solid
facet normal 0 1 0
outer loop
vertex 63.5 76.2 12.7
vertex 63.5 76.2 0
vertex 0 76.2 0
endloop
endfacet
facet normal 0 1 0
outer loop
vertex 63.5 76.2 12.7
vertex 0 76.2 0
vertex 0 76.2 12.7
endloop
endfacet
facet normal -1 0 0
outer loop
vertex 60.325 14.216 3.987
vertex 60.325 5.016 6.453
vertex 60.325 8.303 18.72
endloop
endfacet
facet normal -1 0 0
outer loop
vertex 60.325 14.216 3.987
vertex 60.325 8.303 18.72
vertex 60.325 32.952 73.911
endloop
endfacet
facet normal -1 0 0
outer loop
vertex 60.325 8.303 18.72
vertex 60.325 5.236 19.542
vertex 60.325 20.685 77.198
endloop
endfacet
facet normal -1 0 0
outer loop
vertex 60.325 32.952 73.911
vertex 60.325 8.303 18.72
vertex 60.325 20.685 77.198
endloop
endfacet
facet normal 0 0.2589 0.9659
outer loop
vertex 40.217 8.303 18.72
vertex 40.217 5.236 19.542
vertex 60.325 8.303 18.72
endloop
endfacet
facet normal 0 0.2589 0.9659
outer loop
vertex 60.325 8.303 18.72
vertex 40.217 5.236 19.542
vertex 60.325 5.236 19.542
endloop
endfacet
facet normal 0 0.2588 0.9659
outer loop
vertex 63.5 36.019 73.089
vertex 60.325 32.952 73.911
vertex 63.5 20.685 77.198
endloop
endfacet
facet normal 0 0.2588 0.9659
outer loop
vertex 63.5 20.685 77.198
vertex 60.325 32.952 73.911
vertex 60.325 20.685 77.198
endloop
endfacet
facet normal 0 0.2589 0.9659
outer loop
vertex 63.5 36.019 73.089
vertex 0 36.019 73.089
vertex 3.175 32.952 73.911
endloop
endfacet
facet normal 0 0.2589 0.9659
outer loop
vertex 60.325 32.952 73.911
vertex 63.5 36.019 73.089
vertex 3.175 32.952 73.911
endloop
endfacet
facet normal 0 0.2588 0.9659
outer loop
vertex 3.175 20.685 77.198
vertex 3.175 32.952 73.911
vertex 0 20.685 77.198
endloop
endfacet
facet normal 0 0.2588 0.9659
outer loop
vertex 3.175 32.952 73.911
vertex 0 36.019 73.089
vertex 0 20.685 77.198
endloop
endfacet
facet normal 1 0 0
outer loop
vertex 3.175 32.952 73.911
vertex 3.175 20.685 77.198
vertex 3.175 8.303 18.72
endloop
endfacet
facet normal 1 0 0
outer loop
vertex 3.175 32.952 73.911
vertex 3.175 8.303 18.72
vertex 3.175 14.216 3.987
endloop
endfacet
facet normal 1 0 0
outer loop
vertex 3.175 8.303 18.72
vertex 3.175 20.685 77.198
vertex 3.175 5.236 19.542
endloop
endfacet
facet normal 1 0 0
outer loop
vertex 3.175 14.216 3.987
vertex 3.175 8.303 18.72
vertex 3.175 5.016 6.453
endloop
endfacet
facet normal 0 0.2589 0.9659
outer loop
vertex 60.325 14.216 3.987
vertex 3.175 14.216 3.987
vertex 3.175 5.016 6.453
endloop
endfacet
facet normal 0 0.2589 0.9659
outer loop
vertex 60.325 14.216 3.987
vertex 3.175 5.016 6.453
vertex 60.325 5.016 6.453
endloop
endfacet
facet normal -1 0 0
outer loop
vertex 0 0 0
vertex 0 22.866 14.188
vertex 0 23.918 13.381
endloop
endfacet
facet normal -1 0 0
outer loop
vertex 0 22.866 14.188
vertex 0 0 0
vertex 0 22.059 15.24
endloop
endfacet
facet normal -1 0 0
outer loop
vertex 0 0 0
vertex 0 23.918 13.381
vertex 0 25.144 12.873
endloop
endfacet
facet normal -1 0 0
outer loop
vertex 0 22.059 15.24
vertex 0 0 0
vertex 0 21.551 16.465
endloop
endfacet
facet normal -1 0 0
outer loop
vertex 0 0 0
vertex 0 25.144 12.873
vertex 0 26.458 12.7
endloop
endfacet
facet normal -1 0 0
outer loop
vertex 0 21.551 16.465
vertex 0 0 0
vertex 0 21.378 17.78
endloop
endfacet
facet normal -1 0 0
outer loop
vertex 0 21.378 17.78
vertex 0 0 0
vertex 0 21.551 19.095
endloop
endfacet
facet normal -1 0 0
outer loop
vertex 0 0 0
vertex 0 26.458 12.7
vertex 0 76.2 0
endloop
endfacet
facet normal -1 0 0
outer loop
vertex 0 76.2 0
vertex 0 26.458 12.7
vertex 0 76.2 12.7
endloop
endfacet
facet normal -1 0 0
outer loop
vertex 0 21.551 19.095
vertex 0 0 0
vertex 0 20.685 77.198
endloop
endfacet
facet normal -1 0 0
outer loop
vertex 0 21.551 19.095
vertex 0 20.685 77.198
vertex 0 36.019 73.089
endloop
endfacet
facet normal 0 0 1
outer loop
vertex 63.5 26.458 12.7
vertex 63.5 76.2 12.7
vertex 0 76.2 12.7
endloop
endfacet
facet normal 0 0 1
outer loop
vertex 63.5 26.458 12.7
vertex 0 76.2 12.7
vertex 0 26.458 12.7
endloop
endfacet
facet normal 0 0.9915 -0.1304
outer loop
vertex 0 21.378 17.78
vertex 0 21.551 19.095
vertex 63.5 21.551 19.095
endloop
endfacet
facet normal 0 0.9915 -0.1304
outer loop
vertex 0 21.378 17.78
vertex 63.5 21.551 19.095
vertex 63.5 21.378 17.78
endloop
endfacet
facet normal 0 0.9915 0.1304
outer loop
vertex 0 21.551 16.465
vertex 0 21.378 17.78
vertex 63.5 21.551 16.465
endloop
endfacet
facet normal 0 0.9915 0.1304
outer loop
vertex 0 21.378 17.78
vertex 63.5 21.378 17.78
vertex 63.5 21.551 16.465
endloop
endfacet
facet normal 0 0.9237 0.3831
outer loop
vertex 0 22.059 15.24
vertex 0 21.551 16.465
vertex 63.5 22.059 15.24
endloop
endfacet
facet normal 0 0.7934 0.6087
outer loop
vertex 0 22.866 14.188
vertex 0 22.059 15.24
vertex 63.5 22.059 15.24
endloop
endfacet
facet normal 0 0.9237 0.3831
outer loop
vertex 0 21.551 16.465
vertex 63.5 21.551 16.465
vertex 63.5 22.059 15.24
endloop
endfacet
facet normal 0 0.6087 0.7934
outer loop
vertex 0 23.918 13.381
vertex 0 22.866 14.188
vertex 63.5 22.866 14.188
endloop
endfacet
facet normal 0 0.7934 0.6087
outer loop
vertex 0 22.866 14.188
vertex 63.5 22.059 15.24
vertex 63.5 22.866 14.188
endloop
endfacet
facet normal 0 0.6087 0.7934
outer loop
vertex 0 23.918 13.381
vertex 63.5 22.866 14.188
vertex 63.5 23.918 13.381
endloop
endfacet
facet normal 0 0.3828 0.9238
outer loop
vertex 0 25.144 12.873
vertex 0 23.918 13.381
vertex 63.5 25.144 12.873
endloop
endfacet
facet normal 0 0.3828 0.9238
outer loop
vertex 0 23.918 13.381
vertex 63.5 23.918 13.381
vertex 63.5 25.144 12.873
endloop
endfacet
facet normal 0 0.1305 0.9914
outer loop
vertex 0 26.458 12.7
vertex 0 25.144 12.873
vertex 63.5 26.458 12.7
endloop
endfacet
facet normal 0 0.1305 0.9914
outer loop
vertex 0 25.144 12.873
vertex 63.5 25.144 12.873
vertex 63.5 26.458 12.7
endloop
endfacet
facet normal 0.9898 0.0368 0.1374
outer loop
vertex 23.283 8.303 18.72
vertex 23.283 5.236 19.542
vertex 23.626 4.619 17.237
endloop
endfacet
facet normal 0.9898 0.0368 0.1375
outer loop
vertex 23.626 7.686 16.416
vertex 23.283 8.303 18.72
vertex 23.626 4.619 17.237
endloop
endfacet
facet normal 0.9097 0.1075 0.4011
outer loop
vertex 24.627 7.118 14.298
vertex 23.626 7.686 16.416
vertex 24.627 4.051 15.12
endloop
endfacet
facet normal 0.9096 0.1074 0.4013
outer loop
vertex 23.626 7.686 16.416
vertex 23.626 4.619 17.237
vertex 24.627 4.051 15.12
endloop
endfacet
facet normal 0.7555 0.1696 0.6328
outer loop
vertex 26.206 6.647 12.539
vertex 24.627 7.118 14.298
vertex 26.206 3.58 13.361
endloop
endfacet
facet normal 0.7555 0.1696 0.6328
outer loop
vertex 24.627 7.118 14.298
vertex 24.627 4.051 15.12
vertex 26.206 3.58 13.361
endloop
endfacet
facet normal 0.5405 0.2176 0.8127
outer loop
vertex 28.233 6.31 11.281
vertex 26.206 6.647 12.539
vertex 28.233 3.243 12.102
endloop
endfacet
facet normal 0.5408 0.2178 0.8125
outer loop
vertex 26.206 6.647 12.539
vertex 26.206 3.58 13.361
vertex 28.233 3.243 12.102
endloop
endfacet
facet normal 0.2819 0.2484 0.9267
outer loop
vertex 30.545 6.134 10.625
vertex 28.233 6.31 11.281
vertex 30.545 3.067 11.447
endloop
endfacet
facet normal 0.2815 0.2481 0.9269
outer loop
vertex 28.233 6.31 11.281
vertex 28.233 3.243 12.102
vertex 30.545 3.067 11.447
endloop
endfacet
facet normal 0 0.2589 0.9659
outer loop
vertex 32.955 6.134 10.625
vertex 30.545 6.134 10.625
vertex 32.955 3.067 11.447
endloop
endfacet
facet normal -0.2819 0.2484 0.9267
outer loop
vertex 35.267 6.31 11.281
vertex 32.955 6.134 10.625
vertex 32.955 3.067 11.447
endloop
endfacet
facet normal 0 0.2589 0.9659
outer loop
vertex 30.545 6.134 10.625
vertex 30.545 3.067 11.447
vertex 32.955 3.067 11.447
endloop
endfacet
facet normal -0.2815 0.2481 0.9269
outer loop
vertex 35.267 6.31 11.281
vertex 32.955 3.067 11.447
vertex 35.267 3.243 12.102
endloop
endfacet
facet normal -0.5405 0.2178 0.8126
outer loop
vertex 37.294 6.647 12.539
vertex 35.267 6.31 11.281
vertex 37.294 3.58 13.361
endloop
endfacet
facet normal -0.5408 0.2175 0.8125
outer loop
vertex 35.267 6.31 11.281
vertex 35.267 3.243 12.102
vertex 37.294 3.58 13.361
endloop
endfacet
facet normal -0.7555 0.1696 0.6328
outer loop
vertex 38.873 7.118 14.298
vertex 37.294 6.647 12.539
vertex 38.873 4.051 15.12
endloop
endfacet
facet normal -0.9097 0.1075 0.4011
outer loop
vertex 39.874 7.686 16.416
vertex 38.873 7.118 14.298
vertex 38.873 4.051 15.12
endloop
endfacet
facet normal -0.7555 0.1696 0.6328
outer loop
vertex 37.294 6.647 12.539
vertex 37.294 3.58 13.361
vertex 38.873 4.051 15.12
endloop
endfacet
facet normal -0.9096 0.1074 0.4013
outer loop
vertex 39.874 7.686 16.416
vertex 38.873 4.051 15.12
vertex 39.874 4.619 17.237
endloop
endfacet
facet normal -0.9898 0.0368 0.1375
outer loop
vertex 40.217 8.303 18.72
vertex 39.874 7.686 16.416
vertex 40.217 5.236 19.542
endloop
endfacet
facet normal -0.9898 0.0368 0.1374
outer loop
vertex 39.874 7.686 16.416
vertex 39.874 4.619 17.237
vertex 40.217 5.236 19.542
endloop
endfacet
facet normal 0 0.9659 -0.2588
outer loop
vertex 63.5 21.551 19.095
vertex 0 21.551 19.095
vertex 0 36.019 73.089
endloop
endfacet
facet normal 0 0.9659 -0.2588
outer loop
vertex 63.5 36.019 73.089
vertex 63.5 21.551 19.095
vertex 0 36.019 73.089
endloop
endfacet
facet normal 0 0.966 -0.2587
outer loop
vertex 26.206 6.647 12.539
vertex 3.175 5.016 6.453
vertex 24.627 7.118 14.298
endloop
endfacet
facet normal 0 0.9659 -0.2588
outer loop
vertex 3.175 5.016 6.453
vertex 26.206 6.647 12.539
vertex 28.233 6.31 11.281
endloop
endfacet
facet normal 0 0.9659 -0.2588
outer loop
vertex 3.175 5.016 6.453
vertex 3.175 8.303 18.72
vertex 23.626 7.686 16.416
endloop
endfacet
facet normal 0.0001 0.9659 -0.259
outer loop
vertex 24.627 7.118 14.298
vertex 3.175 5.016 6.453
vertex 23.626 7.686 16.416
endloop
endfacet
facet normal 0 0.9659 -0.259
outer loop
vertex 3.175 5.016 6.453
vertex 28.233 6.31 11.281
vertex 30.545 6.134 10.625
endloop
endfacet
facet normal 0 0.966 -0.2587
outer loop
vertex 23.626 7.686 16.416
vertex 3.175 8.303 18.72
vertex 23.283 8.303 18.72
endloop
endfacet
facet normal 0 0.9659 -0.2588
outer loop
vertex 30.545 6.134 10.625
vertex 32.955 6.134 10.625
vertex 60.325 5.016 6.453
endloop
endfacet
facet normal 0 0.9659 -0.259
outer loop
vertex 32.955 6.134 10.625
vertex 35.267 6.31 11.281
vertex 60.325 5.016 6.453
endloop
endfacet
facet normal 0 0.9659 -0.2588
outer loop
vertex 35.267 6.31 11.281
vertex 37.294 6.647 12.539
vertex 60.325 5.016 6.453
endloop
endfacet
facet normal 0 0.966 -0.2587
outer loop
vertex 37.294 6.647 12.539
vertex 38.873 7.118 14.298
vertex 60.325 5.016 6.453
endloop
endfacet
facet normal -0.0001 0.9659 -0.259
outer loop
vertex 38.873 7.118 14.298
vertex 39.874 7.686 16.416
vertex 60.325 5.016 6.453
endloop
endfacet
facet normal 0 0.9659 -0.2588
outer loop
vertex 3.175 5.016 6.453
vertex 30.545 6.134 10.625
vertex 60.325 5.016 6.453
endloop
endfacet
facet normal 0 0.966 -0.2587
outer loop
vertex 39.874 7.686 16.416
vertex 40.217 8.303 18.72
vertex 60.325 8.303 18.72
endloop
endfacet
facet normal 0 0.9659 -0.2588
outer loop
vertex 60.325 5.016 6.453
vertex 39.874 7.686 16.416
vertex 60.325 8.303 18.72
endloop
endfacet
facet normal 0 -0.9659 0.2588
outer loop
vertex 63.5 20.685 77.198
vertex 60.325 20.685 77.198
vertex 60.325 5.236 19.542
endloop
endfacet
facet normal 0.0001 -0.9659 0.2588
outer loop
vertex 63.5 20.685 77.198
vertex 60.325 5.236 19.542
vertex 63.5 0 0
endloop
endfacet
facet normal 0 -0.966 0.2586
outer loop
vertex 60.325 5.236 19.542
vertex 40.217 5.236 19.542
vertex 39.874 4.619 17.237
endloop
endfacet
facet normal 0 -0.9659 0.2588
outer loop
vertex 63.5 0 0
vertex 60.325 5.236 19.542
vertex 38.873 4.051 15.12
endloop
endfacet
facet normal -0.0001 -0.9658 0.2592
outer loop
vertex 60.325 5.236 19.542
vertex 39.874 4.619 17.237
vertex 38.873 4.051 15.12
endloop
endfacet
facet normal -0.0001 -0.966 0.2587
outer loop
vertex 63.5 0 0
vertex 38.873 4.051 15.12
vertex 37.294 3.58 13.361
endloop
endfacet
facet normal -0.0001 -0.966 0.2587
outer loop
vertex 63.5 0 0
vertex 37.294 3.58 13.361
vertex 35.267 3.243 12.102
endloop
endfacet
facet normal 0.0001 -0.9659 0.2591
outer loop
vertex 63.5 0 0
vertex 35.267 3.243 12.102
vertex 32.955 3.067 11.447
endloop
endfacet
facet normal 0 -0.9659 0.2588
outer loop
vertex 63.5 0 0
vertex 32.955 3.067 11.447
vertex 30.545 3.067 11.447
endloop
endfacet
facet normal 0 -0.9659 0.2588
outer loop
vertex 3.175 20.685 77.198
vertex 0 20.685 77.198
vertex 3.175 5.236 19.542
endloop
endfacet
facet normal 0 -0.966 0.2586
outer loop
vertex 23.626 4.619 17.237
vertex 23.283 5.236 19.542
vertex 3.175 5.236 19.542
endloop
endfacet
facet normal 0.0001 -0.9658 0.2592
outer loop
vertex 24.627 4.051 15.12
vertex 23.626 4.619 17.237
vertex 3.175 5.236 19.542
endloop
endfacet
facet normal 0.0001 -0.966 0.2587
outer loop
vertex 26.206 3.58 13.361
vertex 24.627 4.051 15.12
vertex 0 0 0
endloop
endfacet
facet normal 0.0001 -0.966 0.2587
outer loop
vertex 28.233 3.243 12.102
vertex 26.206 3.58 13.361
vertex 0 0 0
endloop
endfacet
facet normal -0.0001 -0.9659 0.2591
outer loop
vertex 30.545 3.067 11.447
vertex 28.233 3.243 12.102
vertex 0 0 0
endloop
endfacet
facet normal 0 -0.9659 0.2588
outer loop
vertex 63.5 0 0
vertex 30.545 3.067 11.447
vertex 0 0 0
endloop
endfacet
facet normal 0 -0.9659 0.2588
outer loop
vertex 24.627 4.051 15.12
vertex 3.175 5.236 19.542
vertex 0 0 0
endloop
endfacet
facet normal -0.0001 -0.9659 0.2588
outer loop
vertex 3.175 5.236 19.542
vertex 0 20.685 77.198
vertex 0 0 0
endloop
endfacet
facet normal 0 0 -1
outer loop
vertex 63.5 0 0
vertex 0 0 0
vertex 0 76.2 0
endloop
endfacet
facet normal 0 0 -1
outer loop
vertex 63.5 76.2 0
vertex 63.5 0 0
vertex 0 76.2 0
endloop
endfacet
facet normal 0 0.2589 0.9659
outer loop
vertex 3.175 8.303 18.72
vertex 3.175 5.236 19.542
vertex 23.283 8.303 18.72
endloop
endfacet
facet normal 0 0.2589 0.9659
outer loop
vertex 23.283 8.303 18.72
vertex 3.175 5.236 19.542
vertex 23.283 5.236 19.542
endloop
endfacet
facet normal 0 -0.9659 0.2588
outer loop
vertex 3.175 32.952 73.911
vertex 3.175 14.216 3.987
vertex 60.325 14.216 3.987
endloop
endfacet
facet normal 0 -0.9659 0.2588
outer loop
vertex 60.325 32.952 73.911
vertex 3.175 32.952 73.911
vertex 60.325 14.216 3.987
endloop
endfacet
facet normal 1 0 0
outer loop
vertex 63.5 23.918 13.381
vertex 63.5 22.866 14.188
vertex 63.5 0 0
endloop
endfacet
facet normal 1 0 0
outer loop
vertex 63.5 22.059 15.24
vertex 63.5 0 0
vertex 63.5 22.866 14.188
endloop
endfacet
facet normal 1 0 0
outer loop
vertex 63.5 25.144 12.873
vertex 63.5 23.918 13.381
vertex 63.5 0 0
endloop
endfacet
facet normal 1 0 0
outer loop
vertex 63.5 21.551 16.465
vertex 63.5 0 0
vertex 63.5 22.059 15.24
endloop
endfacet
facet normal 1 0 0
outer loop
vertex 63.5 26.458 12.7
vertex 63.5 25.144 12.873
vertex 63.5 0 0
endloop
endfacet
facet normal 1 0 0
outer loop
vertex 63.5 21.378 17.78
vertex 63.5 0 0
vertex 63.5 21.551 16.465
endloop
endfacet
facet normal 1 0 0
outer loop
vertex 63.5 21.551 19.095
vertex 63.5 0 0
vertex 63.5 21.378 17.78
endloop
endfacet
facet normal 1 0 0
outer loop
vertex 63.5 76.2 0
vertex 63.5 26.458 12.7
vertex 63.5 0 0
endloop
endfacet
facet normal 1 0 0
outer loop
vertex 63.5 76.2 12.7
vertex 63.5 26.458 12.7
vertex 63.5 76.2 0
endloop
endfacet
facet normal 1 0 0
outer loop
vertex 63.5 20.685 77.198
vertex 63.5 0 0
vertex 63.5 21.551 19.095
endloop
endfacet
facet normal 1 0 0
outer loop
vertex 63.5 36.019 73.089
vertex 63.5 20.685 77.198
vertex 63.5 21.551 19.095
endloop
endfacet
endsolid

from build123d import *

# Parameters (mm, degrees)
F1_DEPTH = 63.5
F2_W     = 57.15
F2_H     = 9.525
F3_DEPTH = 72.39
F5_DEPTH = 3.175
F6_R     = 5.08


with BuildPart() as f1:
    # F0 (on Right) → F1 (new body)
    with BuildSketch(Plane.YZ):
        Polygon((20.6850513497, 77.1976625943), (0, 0), (76.2, 0), (76.2, 12.7), (19.8379641079, 12.7), (36.0191238421, 73.0889102533), align=None)
    extrude(amount=F1_DEPTH)

    # F2 (on face) → F3 (cut)
    with BuildSketch(Plane(origin=(0, 20.6850513497, 77.1976625943), x_dir=(1, 0, 0), z_dir=(0, 0.2588190451, 0.9659258263))):
        with Locations((31.75, 7.9375)):
            Rectangle(F2_W, F2_H)
    extrude(amount=-F3_DEPTH, mode=Mode.SUBTRACT)

    # F4 (on face) → F5 (cut, through all)
    with BuildSketch(Plane(origin=(0, 0, 0), x_dir=(1, 0, 0), z_dir=(0, -0.9659258263, 0.2588190451))):
        Polygon((60.325, 79.9209012672), (3.175, 79.9209012672), (3.175, 20.2309012672), (23.2833333333, 20.2309012672), (40.2166666667, 20.2309012672), (60.325, 20.2309012672), align=None)
        with BuildLine():
            Line((40.2166666667, 20.2309012672), (23.2833333333, 20.2309012672))
            ThreePointArc((23.2833333333, 20.2309012672), (31.75, 11.7642346006), (40.2166666667, 20.2309012672))
        make_face()
    extrude(amount=-F5_DEPTH, mode=Mode.SUBTRACT)

    # F6
    f6_edges = [f1.edges().sort_by_distance(p)[0] for p in [
        (31.75, 19.837964, 12.7),
    ]]
    fillet(f6_edges, radius=F6_R)


solid = f1.part
